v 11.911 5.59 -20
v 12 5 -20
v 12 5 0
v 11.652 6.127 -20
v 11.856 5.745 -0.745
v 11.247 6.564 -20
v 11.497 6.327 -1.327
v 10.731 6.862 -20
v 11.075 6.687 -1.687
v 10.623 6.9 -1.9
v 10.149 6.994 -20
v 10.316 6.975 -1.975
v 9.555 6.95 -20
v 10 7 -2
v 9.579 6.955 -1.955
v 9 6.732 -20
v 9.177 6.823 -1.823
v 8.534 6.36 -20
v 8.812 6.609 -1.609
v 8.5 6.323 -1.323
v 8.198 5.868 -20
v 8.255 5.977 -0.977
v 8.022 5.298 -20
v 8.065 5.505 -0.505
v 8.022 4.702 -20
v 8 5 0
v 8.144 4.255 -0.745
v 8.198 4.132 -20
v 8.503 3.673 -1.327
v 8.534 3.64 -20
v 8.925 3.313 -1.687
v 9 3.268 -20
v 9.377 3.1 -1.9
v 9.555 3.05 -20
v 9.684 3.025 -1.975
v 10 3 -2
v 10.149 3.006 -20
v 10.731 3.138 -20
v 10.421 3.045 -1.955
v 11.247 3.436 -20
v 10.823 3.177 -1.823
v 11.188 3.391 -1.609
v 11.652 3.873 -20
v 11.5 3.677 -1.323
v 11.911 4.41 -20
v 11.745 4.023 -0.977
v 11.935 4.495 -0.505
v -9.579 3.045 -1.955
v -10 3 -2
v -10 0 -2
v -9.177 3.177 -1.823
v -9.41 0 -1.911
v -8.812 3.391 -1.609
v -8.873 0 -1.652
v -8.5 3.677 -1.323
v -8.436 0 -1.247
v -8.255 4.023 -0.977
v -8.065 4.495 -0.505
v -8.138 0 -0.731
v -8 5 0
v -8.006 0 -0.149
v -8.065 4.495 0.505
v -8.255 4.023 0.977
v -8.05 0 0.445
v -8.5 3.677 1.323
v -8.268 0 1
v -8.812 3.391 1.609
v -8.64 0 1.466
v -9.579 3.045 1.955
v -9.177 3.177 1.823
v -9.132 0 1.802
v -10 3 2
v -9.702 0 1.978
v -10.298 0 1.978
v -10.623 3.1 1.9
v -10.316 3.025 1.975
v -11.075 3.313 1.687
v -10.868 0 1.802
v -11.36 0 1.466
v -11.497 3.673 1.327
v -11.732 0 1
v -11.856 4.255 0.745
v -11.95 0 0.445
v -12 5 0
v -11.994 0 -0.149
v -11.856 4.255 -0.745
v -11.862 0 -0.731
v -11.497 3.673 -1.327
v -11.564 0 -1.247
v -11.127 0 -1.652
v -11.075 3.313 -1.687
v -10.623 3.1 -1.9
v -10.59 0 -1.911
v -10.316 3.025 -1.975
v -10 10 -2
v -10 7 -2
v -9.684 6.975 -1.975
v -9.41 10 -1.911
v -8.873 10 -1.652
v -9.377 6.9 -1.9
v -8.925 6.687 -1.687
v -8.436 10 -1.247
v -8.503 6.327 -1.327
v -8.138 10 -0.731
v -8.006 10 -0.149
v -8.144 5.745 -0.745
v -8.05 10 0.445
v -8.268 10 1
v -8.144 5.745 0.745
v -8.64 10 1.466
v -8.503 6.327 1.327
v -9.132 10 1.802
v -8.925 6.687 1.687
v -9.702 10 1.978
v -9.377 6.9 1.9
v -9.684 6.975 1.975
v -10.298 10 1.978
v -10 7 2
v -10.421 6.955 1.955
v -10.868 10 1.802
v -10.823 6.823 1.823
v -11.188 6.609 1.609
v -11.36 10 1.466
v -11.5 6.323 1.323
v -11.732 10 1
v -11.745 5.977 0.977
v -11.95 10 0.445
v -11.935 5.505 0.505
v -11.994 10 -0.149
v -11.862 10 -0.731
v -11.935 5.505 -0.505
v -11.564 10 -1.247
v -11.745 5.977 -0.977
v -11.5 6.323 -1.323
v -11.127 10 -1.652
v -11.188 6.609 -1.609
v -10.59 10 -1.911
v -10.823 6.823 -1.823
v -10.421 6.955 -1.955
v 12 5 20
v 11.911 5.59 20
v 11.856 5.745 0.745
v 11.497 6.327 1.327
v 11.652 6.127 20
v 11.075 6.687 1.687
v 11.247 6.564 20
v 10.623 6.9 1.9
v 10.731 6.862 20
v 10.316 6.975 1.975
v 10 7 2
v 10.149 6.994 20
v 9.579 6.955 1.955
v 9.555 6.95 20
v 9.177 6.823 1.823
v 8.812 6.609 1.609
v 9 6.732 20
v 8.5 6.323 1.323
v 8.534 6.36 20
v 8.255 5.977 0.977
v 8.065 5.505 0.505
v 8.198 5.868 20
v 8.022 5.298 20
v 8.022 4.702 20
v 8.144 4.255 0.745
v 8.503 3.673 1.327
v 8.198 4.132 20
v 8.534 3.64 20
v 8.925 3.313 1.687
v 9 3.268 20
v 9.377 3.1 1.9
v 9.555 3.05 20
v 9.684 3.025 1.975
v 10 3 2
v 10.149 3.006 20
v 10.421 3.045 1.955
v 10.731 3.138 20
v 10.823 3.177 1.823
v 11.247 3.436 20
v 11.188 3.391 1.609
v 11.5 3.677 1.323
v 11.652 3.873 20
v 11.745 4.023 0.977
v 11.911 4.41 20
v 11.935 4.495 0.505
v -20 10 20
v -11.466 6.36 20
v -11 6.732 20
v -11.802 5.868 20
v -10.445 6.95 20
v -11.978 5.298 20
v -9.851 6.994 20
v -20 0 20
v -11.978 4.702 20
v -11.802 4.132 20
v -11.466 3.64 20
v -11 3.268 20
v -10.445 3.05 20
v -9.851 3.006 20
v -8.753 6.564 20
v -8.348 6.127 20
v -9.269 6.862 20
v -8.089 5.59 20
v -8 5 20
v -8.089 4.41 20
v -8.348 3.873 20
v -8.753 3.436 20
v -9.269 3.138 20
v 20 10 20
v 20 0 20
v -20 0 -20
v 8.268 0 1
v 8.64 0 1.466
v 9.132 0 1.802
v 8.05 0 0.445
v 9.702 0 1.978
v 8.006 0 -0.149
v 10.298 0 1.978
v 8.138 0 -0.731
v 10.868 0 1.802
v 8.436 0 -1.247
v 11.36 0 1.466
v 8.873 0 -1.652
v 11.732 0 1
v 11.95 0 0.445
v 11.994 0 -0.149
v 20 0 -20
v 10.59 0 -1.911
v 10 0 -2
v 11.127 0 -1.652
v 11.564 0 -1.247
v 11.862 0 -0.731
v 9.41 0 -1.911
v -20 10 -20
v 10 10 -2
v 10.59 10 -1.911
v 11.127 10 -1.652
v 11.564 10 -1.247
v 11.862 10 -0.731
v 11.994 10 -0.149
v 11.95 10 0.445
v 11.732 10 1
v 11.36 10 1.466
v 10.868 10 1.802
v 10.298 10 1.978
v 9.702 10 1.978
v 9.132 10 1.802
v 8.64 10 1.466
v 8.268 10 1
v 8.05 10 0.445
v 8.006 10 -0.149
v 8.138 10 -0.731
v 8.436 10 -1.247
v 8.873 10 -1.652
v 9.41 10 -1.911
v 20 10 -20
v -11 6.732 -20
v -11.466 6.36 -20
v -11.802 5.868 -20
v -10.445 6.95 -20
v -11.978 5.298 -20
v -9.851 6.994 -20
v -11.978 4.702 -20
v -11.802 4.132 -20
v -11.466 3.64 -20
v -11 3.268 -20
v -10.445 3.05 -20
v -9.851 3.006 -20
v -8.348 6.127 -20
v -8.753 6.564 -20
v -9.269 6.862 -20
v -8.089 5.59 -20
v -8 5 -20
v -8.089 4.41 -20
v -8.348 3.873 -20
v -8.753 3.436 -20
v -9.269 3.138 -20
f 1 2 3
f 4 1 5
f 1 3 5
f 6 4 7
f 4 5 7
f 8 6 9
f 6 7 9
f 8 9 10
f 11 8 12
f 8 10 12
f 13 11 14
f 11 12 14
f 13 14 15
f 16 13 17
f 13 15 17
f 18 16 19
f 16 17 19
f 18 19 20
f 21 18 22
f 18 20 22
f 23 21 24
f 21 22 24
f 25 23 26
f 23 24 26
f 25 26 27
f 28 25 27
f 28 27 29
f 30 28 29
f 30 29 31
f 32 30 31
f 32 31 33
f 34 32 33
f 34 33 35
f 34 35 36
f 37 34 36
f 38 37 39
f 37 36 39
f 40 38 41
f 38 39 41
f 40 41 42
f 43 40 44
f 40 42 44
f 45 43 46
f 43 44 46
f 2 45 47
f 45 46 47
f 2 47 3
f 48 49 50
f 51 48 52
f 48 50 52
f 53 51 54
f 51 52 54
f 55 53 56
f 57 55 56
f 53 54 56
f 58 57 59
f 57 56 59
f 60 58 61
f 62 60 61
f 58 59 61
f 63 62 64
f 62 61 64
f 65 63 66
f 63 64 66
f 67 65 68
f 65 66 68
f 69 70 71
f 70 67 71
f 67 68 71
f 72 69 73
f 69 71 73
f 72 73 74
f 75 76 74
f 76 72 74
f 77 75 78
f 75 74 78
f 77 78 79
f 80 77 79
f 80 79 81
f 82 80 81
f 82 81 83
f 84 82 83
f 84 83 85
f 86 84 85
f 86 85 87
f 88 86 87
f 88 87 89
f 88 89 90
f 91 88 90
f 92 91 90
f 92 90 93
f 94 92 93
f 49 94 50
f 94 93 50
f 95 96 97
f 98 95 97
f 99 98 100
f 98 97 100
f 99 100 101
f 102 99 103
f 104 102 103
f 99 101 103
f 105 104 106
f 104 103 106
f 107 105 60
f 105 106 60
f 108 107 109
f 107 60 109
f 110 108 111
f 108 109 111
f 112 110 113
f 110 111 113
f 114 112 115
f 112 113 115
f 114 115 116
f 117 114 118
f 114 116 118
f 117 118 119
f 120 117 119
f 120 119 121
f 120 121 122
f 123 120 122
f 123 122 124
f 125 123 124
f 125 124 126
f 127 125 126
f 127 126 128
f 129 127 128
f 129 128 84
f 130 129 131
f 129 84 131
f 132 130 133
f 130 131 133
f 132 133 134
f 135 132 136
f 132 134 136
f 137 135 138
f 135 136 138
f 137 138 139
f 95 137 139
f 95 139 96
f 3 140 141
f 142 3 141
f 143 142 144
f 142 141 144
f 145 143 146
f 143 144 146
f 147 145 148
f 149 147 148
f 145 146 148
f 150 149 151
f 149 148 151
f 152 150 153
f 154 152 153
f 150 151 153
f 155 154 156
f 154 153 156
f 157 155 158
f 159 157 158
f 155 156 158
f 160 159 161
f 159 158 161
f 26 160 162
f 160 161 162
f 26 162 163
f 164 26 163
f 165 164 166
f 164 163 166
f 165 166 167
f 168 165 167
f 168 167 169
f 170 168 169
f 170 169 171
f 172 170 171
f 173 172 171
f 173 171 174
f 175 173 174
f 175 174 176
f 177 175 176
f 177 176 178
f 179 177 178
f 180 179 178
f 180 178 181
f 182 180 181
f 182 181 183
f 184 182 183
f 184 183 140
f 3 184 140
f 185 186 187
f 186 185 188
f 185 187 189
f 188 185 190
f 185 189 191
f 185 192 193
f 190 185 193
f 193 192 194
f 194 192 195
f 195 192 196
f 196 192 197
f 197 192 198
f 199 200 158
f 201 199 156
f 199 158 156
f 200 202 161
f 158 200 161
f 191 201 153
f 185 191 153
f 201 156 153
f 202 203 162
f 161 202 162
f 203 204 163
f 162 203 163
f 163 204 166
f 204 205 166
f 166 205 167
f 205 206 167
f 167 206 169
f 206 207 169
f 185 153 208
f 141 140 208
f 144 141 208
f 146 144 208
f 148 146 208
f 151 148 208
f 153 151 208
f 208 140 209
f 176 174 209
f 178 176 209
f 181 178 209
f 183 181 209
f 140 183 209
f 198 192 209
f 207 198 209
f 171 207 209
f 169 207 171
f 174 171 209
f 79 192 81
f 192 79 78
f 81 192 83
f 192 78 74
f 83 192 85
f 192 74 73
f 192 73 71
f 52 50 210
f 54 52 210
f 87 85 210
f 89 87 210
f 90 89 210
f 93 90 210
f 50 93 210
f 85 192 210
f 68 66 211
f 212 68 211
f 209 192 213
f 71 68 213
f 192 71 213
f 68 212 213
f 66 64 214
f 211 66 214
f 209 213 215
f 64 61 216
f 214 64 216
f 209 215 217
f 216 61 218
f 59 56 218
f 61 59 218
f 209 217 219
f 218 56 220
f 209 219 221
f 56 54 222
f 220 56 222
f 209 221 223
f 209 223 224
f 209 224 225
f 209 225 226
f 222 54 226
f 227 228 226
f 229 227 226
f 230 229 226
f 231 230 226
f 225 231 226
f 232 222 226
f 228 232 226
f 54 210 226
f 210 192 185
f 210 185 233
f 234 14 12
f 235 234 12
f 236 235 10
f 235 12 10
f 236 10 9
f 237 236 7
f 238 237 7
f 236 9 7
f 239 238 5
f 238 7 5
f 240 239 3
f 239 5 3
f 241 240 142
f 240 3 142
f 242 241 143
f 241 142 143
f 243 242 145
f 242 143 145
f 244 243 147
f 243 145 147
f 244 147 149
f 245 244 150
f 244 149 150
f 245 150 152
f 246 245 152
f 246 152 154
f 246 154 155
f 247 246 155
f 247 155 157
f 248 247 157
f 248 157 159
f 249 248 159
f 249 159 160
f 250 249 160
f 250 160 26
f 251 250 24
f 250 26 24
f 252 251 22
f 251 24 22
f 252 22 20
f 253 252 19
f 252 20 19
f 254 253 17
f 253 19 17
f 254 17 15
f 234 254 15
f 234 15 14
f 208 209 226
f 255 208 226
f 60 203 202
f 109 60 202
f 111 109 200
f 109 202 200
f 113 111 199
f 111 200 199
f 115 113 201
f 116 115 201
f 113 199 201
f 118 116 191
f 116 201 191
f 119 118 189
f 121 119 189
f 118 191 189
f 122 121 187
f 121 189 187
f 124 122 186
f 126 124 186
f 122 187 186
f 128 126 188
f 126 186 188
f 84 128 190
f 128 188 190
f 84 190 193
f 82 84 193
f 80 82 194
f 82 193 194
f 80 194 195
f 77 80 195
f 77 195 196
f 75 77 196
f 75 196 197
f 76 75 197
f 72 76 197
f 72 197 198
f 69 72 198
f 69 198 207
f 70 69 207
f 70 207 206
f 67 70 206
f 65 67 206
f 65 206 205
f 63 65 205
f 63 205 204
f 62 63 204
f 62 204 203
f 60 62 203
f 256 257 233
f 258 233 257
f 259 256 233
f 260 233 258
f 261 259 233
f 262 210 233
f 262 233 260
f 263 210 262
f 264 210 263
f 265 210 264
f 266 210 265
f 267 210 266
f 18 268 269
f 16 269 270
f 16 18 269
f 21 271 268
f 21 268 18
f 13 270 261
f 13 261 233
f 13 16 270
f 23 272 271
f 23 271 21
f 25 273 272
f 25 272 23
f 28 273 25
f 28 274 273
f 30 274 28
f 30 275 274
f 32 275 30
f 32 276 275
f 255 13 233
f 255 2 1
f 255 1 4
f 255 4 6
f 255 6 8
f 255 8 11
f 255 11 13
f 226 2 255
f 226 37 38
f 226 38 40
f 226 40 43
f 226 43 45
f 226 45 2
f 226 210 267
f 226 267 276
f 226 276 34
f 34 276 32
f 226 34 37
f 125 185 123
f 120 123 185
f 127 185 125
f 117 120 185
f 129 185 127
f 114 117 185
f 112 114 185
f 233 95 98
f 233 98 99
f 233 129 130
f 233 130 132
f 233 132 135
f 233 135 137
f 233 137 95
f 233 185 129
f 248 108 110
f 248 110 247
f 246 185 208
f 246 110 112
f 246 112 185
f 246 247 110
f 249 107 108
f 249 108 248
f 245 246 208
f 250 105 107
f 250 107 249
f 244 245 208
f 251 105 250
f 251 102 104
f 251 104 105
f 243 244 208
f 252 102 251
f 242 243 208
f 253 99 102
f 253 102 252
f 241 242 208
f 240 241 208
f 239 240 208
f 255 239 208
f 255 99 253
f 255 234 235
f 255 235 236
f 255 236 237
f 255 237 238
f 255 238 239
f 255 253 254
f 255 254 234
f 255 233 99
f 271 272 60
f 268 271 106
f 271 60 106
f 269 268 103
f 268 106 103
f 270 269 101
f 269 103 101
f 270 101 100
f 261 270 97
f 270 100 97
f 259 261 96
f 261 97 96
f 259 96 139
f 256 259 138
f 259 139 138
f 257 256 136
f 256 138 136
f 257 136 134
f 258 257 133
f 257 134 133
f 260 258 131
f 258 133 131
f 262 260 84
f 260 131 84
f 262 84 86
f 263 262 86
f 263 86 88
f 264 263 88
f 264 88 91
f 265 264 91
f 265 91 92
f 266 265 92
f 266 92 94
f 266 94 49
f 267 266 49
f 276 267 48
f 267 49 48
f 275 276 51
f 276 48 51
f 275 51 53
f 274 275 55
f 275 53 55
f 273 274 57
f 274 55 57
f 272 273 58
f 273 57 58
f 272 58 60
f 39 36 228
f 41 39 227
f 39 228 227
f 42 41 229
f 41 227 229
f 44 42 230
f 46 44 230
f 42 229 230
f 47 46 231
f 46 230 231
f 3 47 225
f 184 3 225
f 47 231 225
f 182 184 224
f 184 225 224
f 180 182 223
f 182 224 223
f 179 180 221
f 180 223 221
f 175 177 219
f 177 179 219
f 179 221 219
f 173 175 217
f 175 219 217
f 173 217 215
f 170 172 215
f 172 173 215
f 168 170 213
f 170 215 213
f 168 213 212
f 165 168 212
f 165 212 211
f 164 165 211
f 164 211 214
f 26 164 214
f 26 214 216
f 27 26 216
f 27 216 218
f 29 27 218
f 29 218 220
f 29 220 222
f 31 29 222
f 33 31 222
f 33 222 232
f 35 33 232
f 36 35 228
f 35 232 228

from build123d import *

# Parameters (mm, degrees)
SKETCH2_W           = 40
SKETCH2_H           = 40
BOSS_EXTRUDE1_DEPTH = 10
SKETCH3_R           = 2
CUT_EXTRUDE1_DEPTH  = 51
SKETCH4_R           = 2
CUT_EXTRUDE2_DEPTH  = 12


with BuildPart() as part:
    # Sketch2 → Boss-Extrude1 (new body)
    with BuildSketch(Plane(origin=(0, 0, 0), x_dir=(1, 0, 0), z_dir=(0, 1, 0))):
        Rectangle(SKETCH2_W, SKETCH2_H)
    extrude(amount=BOSS_EXTRUDE1_DEPTH)

    # Sketch3 → Cut-Extrude1 (cut)
    with BuildSketch(Plane.XY.offset(20)):
        with Locations((10, 5)):
            Circle(SKETCH3_R)
        with Locations((-10, 5)):
            Circle(SKETCH3_R)
    extrude(amount=-CUT_EXTRUDE1_DEPTH, mode=Mode.SUBTRACT)

    # Sketch4 → Cut-Extrude2 (cut)
    with BuildSketch(Plane.XZ):
        with Locations(Location((10, 0, 0), (0, 0, 270))):
            Circle(SKETCH4_R)
        with Locations(Location((-10, 0, 0), (0, 0, 270))):
            Circle(SKETCH4_R)
    extrude(amount=-CUT_EXTRUDE2_DEPTH, mode=Mode.SUBTRACT)


solid = part.part
